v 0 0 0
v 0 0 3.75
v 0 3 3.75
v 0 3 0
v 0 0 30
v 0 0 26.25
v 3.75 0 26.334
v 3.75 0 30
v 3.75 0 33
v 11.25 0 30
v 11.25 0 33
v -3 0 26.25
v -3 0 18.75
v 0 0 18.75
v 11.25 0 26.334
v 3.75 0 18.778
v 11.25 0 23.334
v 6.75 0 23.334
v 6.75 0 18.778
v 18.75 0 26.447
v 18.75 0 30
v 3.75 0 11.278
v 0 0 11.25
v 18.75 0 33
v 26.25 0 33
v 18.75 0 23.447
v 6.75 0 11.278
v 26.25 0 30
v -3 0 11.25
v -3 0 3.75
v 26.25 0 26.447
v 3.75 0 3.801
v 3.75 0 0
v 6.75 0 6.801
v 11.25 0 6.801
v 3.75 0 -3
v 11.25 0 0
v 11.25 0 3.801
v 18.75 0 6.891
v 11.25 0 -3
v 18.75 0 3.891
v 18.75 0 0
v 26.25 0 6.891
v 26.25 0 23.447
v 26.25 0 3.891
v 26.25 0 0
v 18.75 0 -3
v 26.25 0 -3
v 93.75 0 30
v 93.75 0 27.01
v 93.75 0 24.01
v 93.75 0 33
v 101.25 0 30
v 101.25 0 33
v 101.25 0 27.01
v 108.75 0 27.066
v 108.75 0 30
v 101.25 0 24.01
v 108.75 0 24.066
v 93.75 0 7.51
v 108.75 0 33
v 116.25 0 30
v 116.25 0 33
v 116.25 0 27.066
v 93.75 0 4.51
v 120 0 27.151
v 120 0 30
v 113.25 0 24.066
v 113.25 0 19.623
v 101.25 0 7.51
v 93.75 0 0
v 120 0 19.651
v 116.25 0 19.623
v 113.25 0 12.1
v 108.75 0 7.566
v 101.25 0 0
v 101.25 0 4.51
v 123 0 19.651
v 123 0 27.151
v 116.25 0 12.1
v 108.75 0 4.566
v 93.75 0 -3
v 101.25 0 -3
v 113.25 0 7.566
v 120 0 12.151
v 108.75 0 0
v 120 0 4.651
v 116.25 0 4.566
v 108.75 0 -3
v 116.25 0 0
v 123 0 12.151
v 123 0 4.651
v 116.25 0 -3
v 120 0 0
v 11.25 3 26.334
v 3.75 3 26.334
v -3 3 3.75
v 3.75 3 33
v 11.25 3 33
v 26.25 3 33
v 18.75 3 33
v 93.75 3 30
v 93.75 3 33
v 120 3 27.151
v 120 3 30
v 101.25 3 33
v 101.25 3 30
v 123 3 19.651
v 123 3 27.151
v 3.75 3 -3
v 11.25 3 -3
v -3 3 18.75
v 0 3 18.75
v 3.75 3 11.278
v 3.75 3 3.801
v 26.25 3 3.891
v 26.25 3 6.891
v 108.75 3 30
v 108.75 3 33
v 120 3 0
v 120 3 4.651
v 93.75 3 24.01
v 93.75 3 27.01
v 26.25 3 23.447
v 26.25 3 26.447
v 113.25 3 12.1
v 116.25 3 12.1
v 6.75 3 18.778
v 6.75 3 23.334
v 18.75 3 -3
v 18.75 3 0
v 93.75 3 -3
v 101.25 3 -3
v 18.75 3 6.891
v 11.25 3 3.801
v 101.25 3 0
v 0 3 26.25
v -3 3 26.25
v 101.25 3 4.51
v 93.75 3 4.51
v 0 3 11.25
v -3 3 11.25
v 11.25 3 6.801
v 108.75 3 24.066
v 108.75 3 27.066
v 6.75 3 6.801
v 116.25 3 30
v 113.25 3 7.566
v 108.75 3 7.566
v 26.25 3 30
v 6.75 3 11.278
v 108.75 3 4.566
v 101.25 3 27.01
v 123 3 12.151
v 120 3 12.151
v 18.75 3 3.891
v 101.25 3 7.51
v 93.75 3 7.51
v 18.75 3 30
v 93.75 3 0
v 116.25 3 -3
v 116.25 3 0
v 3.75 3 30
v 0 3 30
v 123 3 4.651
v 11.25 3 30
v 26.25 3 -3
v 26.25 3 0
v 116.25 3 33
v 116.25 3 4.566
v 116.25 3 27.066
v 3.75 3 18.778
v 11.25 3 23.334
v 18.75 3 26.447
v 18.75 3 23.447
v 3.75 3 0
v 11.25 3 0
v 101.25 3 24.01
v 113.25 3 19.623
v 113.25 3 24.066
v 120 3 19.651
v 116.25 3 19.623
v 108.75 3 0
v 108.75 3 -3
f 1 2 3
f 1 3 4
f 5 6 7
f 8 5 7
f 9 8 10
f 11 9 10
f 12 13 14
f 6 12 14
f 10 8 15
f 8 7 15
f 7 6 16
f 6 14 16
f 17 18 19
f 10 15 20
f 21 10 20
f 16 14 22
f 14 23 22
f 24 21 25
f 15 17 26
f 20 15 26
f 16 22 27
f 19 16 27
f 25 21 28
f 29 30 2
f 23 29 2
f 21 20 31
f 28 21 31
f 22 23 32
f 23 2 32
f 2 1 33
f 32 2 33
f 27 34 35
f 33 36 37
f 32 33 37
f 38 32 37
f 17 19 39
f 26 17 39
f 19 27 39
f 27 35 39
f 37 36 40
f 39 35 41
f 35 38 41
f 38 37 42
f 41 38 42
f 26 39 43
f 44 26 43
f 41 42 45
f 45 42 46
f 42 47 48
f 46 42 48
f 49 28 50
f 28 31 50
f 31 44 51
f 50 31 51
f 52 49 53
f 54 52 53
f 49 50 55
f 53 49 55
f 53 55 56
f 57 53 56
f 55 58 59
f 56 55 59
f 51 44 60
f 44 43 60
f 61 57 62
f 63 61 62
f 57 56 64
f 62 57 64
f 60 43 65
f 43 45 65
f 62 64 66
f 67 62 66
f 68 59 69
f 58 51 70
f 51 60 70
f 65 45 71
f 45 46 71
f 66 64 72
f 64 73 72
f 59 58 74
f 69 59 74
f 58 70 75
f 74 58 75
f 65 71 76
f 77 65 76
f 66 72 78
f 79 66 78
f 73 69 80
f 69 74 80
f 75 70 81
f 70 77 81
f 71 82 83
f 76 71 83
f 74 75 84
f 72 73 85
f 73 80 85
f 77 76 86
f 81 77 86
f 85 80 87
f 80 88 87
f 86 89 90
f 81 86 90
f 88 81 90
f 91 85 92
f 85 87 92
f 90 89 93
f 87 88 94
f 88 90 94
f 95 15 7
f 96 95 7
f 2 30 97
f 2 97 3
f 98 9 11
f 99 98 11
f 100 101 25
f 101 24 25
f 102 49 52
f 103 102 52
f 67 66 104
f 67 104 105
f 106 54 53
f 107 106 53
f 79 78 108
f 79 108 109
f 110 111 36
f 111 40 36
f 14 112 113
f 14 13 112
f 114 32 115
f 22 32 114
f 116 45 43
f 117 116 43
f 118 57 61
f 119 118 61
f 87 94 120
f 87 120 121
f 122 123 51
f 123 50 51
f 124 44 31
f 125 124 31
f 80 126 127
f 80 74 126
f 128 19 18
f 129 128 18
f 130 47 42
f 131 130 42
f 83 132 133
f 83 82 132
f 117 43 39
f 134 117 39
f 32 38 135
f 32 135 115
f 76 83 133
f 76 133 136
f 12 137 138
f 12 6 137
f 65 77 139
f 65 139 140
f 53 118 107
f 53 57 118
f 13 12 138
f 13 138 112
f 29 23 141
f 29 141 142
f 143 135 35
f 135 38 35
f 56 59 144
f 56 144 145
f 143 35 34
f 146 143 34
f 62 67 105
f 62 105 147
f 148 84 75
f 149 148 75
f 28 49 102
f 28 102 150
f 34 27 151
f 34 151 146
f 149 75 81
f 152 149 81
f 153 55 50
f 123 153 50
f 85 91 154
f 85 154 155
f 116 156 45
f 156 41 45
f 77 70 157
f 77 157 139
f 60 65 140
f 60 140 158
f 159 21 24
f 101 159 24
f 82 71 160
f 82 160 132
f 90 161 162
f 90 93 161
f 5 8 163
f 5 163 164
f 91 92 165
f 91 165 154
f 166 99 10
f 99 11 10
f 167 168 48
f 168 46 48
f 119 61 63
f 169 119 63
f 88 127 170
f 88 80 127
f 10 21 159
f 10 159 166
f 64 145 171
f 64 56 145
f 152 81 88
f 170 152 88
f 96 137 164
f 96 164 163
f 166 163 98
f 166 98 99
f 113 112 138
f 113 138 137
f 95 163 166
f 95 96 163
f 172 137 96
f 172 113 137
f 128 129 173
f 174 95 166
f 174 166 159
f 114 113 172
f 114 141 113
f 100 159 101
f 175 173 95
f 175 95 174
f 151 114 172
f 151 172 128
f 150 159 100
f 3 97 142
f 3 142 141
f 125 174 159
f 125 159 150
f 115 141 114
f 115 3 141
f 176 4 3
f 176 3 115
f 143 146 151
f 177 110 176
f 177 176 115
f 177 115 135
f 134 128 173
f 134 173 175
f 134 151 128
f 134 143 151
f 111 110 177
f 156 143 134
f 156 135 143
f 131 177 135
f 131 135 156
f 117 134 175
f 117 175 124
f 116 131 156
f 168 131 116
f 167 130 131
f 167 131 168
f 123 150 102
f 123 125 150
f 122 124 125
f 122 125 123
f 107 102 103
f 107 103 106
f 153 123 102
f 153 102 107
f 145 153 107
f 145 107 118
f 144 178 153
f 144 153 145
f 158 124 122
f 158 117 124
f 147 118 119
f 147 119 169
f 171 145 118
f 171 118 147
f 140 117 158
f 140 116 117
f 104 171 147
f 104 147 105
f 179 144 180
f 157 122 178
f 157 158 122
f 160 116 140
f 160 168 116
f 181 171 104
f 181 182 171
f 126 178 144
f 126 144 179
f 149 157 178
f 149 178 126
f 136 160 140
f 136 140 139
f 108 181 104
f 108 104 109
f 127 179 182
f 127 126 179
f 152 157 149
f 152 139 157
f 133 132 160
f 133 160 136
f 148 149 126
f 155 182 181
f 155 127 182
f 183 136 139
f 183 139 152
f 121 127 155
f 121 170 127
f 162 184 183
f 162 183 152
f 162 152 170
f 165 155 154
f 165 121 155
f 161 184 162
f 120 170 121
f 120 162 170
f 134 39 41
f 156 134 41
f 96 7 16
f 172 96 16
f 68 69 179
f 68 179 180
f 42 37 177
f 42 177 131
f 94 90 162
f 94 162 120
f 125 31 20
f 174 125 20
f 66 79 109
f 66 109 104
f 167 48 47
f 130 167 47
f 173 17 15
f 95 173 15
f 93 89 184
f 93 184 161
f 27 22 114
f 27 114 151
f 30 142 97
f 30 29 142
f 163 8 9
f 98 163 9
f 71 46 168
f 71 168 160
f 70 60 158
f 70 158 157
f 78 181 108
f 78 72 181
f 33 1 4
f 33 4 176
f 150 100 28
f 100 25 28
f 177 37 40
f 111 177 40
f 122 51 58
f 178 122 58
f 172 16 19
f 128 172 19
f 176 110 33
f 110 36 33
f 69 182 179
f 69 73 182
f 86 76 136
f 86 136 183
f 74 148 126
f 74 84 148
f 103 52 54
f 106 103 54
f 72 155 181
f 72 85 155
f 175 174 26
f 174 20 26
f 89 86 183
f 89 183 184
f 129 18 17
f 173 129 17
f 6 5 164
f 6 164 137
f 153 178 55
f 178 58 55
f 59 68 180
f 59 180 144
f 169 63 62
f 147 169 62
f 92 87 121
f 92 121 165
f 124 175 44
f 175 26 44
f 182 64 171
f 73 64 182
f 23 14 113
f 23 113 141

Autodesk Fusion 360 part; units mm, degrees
sketch "Sketch1" plane through (0, 0, 0) normal (0, 1, 0) x (1, 0, 0)
  line L0 (0, 0) -> (120, 0)
  line L1 (120, 0) -> (120, -30)
  line L2 (120, -30) -> (0, -30)
  line L3 (0, -30) -> (0, 0)
  dimension "d3" = 120
  dimension "d4" = 30
extrude "Extrude1" add sketch "Sketch1" along normal blind 3
sketch "Sketch3" plane through (0, 0, 0) normal (0, 1, 0) x (1, 0, 0)
  line L0 (120, -30) -> (0, -30)
  line L1 (0, -30) -> (0, 0)
  line L2 (0, 0) -> (120, 0)
  line L3 (120, 0) -> (120, -30)
  line L4 (0, -26.25) -> (-3, -26.25)
  line L5 (-3, -26.25) -> (-3, -18.75)
  line L6 (-3, -18.75) -> (0, -18.75)
  line L7 (0, -18.75) -> (0, -26.25)
  line L8 (0, -11.25) -> (-3, -11.25)
  line L9 (-3, -11.25) -> (-3, -3.75)
  line L10 (-3, -3.75) -> (0, -3.75)
  line L11 (0, -3.75) -> (0, -11.25)
  line L12 (3.75, 0) -> (11.25, 0)
  line L13 (11.25, 0) -> (11.25, 3)
  line L14 (11.25, 3) -> (3.75, 3)
  line L15 (3.75, 3) -> (3.75, 0)
  line L16 (18.75, 0) -> (26.25, 0)
  line L17 (26.25, 0) -> (26.25, 3)
  line L18 (26.25, 3) -> (18.75, 3)
  line L19 (18.75, 3) -> (18.75, 0)
  line L20 (116.25, 0) -> (108.75, 0)
  line L21 (108.75, 0) -> (108.75, 3)
  line L22 (108.75, 3) -> (116.25, 3)
  line L23 (116.25, 3) -> (116.25, 0)
  line L24 (101.25, 0) -> (93.75, 0)
  line L25 (93.75, 0) -> (93.75, 3)
  line L26 (93.75, 3) -> (101.25, 3)
  line L27 (101.25, 3) -> (101.25, 0)
  line L28 (120, -4.6509) -> (123, -4.6509)
  line L29 (123, -4.6509) -> (123, -12.1509)
  line L30 (123, -12.1509) -> (120, -12.1509)
  line L31 (120, -12.1509) -> (120, -4.6509)
  line L32 (120, -19.6509) -> (123, -19.6509)
  line L33 (123, -19.6509) -> (123, -27.1509)
  line L34 (123, -27.1509) -> (120, -27.1509)
  line L35 (120, -27.1509) -> (120, -19.6509)
  line L36 (116.25, -30) -> (108.75, -30)
  line L37 (108.75, -30) -> (108.75, -33)
  line L38 (108.75, -33) -> (116.25, -33)
  line L39 (116.25, -33) -> (116.25, -30)
  line L40 (101.25, -30) -> (93.75, -30)
  line L41 (93.75, -30) -> (93.75, -33)
  line L42 (93.75, -33) -> (101.25, -33)
  line L43 (101.25, -33) -> (101.25, -30)
  line L44 (26.25, -30) -> (18.75, -30)
  line L45 (18.75, -30) -> (18.75, -33)
  line L46 (18.75, -33) -> (26.25, -33)
  line L47 (26.25, -33) -> (26.25, -30)
  line L48 (11.25, -30) -> (3.75, -30)
  line L49 (3.75, -30) -> (3.75, -33)
  line L50 (3.75, -33) -> (11.25, -33)
  line L51 (11.25, -33) -> (11.25, -30)
  line L52 (3.75, 3) -> (0, 3) construction
  line L53 (11.25, 3) -> (18.75, 3) construction
  line L54 (101.25, 3) -> (108.75, 3) construction
  line L55 (116.25, 3) -> (120, 3) construction
  line L56 (120, 0) -> (120, -4.6509) construction
  line L57 (123, -12.1509) -> (123, -19.6509) construction
  line L58 (108.75, -33) -> (101.25, -33) construction
  line L59 (120, -30) -> (116.25, -30) construction
  dimension "d10" = 3
  dimension "d11" = 7.5
  dimension "d13" = 3
  dimension "d14" = 3.75
  dimension "d15" = 3.75
  dimension "d16" = 7.5
  dimension "d17" = 7.5
  dimension "d18" = 3.75
  dimension "d19" = 3.75
  dimension "d20" = 7.5
  dimension "d21" = 7.5
  dimension "d22" = 3.75
  dimension "d23" = 7.5
  dimension "d24" = 7.5
  dimension "d25" = 3.75
extrude "Extrude2" add sketch "Sketch3" along normal blind 3 contours L0 L36 L37 L38 L39 | L3 L32 L33 L34 L35 | L0 L40 L41 L42 L43 | L3 L28 L29 L30 L31 | L0 L44 L45 L46 L47 | L2 L20 L21 L22 L23 | L0 L48 L49 L50 L51 | L2 L24 L25 L26 L27 | L1 L4 L5 L6 L7 | L2 L16 L17 L18 L19 | L1 L8 L9 L10 L11 | L2 L12 L13 L14 L15
sketch "Sketch4" plane through (0, 0, 0) normal (0, 1, 0) x (1, 0, 0)
  line L0 (120, -30) -> (116.25, -30)
  line L1 (116.25, -30) -> (116.25, -33)
  line L2 (116.25, -33) -> (108.75, -33)
  line L3 (108.75, -33) -> (108.75, -30)
  line L4 (108.75, -30) -> (101.25, -30)
  line L5 (101.25, -30) -> (101.25, -33)
  line L6 (101.25, -33) -> (93.75, -33)
  line L7 (93.75, -33) -> (93.75, -30)
  line L8 (93.75, -30) -> (26.25, -30)
  line L9 (26.25, -30) -> (26.25, -33)
  line L10 (26.25, -33) -> (18.75, -33)
  line L11 (18.75, -33) -> (18.75, -30)
  line L12 (18.75, -30) -> (11.25, -30)
  line L13 (11.25, -30) -> (11.25, -33)
  line L14 (11.25, -33) -> (3.75, -33)
  line L15 (3.75, -33) -> (3.75, -30)
  line L16 (3.75, -30) -> (0, -30)
  line L17 (0, -30) -> (0, -26.25)
  line L18 (0, -26.25) -> (-3, -26.25)
  line L19 (-3, -26.25) -> (-3, -18.75)
  line L20 (-3, -18.75) -> (0, -18.75)
  line L21 (0, -18.75) -> (0, -11.25)
  line L22 (0, -11.25) -> (-3, -11.25)
  line L23 (-3, -11.25) -> (-3, -3.75)
  line L24 (-3, -3.75) -> (0, -3.75)
  line L25 (0, -3.75) -> (0, 0)
  line L26 (0, 0) -> (3.75, 0)
  line L27 (3.75, 0) -> (3.75, 3)
  line L28 (3.75, 3) -> (11.25, 3)
  line L29 (11.25, 3) -> (11.25, 0)
  line L30 (11.25, 0) -> (18.75, 0)
  line L31 (18.75, 0) -> (18.75, 3)
  line L32 (18.75, 3) -> (26.25, 3)
  line L33 (26.25, 3) -> (26.25, 0)
  line L34 (26.25, 0) -> (93.75, 0)
  line L35 (93.75, 0) -> (93.75, 3)
  line L36 (93.75, 3) -> (101.25, 3)
  line L37 (101.25, 3) -> (101.25, 0)
  line L38 (101.25, 0) -> (108.75, 0)
  line L39 (108.75, 0) -> (108.75, 3)
  line L40 (108.75, 3) -> (116.25, 3)
  line L41 (116.25, 3) -> (116.25, 0)
  line L42 (116.25, 0) -> (120, 0)
  line L43 (120, 0) -> (120, -4.6509)
  line L44 (120, -4.6509) -> (123, -4.6509)
  line L45 (123, -4.6509) -> (123, -12.1509)
  line L46 (123, -12.1509) -> (120, -12.1509)
  line L47 (120, -12.1509) -> (120, -19.6509)
  line L48 (120, -19.6509) -> (123, -19.6509)
  line L49 (123, -19.6509) -> (123, -27.1509)
  line L50 (123, -27.1509) -> (120, -27.1509)
  line L51 (120, -27.1509) -> (120, -30)
  line L52 (116.25, 0) -> (116.25, -30) construction
  line L53 (120, -27.1509) -> (0, -26.25) construction
  line L54 (0, -18.75) -> (120, -19.6509) construction
  line L55 (120, -12.1509) -> (0, -11.25) construction
  line L56 (0, -3.75) -> (120, -4.6509) construction
  line L57 (108.75, 0) -> (108.75, -30) construction
  line L58 (101.25, -30) -> (101.25, 0) construction
  line L59 (93.75, 0) -> (93.75, -30) construction
  line L60 (26.25, -30) -> (26.25, 0) construction
  line L61 (18.75, 0) -> (18.75, -30) construction
  line L62 (11.25, -30) -> (11.25, 0) construction
  line L63 (3.75, 0) -> (3.75, -30) construction
  line L64 (116.25, -4.6227) -> (113.25, -4.6227)
  line L65 (113.25, -4.6227) -> (113.25, -12.1002)
  line L66 (113.25, -12.1002) -> (116.25, -12.1002)
  line L67 (116.25, -12.1002) -> (116.25, -4.6227)
  line L68 (108.75, -4.5664) -> (116.25, -4.5664)
  line L69 (116.25, -4.5664) -> (116.25, -7.5664)
  line L70 (116.25, -7.5664) -> (108.75, -7.5664)
  line L71 (108.75, -7.5664) -> (108.75, -4.5664)
  line L72 (101.25, -4.5101) -> (93.75, -4.5101)
  line L73 (93.75, -4.5101) -> (93.75, -7.5101)
  line L74 (93.75, -7.5101) -> (101.25, -7.5101)
  line L75 (101.25, -7.5101) -> (101.25, -4.5101)
  line L76 (116.25, -19.6227) -> (113.25, -19.6227)
  line L77 (113.25, -19.6227) -> (113.25, -27.1002)
  line L78 (113.25, -27.1002) -> (116.25, -27.1002)
  line L79 (116.25, -27.1002) -> (116.25, -19.6227)
  line L80 (108.75, -27.0664) -> (116.25, -27.0664)
  line L81 (116.25, -27.0664) -> (116.25, -24.0664)
  line L82 (116.25, -24.0664) -> (108.75, -24.0664)
  line L83 (108.75, -24.0664) -> (108.75, -27.0664)
  line L84 (101.25, -27.0101) -> (93.75, -27.0101)
  line L85 (93.75, -27.0101) -> (93.75, -24.0101)
  line L86 (93.75, -24.0101) -> (101.25, -24.0101)
  line L87 (101.25, -24.0101) -> (101.25, -27.0101)
  line L88 (26.25, -26.4471) -> (18.75, -26.4471)
  line L89 (18.75, -26.4471) -> (18.75, -23.4471)
  line L90 (18.75, -23.4471) -> (26.25, -23.4471)
  line L91 (26.25, -23.4471) -> (26.25, -26.4471)
  line L92 (11.25, -26.3345) -> (3.75, -26.3345)
  line L93 (3.75, -26.3345) -> (3.75, -23.3345)
  line L94 (3.75, -23.3345) -> (11.25, -23.3345)
  line L95 (11.25, -23.3345) -> (11.25, -26.3345)
  line L96 (3.75, -18.7782) -> (6.75, -18.7782)
  line L97 (6.75, -18.7782) -> (6.75, -26.3345)
  line L98 (6.75, -26.3345) -> (3.75, -26.3345)
  line L99 (3.75, -26.3345) -> (3.75, -18.7782)
  line L100 (3.75, -11.2782) -> (6.75, -11.2782)
  line L101 (6.75, -11.2782) -> (6.75, -3.8007)
  line L102 (6.75, -3.8007) -> (3.75, -3.8007)
  line L103 (3.75, -3.8007) -> (3.75, -11.2782)
  line L104 (3.75, -3.8007) -> (11.25, -3.8007)
  line L105 (11.25, -3.8007) -> (11.25, -6.8007)
  line L106 (11.25, -6.8007) -> (3.75, -6.8007)
  line L107 (3.75, -6.8007) -> (3.75, -3.8007)
  line L108 (18.75, -3.8908) -> (26.25, -3.8908)
  line L109 (26.25, -3.8908) -> (26.25, -6.8908)
  line L110 (26.25, -6.8908) -> (18.75, -6.8908)
  line L111 (18.75, -6.8908) -> (18.75, -3.8908)
  dimension "d28" = 3
  dimension "d29" = 3
  dimension "d30" = 3
  dimension "d31" = 3
  dimension "d32" = 3
  dimension "d33" = 3
extrude "Extrude3" cut sketch "Sketch4" along normal up to surface (3 mm away) contours L64 L65 L67 L69 L70 | L64 L65 L68 L69 L70 L71 | L65 L66 L67 L70 | L72 L73 L74 L75 | L76 L77 L79 L82 | L77 L79 L80 L81 L82 | L77 L80 L82 L83 | L84 L85 L86 L87 | L88 L89 L90 L91 | L92 L94 L95 L97 | L92 L93 L94 L97 L98 L99 | L94 L96 L97 L99 | L100 L101 L103 L106 | L101 L102 L103 L104 L106 L107 | L101 L104 L105 L106 | L108 L109 L110 L111
equation "main_length = 120 mm"
equation "main_width = 30 mm"
equation "d3 = main_length"
equation "d4 = main_width"
equation "material_thickness = 3 mm"
equation "d6 = material_thickness"
equation "fit_length = 7.5 mm"
equation "fit_spacing = 7.5 mm"
equation "d10 = material_thickness"
equation "d11 = fit_length"
equation "d13 = material_thickness"
equation "d14 = fit_spacing / 2"
equation "d15 = fit_spacing / 2"
equation "d16 = fit_spacing"
equation "d17 = fit_spacing"
equation "d19 = fit_spacing / 2"
equation "d20 = fit_spacing"
equation "d21 = fit_spacing"
equation "d22 = fit_spacing / 2"
equation "d23 = fit_spacing"
equation "d24 = fit_spacing"
equation "d25 = fit_spacing / 2"
equation "d28 = material_thickness"
equation "d29 = material_thickness"
equation "d30 = material_thickness"
equation "d31 = material_thickness"
equation "d32 = material_thickness"
equation "d33 = material_thickness"
